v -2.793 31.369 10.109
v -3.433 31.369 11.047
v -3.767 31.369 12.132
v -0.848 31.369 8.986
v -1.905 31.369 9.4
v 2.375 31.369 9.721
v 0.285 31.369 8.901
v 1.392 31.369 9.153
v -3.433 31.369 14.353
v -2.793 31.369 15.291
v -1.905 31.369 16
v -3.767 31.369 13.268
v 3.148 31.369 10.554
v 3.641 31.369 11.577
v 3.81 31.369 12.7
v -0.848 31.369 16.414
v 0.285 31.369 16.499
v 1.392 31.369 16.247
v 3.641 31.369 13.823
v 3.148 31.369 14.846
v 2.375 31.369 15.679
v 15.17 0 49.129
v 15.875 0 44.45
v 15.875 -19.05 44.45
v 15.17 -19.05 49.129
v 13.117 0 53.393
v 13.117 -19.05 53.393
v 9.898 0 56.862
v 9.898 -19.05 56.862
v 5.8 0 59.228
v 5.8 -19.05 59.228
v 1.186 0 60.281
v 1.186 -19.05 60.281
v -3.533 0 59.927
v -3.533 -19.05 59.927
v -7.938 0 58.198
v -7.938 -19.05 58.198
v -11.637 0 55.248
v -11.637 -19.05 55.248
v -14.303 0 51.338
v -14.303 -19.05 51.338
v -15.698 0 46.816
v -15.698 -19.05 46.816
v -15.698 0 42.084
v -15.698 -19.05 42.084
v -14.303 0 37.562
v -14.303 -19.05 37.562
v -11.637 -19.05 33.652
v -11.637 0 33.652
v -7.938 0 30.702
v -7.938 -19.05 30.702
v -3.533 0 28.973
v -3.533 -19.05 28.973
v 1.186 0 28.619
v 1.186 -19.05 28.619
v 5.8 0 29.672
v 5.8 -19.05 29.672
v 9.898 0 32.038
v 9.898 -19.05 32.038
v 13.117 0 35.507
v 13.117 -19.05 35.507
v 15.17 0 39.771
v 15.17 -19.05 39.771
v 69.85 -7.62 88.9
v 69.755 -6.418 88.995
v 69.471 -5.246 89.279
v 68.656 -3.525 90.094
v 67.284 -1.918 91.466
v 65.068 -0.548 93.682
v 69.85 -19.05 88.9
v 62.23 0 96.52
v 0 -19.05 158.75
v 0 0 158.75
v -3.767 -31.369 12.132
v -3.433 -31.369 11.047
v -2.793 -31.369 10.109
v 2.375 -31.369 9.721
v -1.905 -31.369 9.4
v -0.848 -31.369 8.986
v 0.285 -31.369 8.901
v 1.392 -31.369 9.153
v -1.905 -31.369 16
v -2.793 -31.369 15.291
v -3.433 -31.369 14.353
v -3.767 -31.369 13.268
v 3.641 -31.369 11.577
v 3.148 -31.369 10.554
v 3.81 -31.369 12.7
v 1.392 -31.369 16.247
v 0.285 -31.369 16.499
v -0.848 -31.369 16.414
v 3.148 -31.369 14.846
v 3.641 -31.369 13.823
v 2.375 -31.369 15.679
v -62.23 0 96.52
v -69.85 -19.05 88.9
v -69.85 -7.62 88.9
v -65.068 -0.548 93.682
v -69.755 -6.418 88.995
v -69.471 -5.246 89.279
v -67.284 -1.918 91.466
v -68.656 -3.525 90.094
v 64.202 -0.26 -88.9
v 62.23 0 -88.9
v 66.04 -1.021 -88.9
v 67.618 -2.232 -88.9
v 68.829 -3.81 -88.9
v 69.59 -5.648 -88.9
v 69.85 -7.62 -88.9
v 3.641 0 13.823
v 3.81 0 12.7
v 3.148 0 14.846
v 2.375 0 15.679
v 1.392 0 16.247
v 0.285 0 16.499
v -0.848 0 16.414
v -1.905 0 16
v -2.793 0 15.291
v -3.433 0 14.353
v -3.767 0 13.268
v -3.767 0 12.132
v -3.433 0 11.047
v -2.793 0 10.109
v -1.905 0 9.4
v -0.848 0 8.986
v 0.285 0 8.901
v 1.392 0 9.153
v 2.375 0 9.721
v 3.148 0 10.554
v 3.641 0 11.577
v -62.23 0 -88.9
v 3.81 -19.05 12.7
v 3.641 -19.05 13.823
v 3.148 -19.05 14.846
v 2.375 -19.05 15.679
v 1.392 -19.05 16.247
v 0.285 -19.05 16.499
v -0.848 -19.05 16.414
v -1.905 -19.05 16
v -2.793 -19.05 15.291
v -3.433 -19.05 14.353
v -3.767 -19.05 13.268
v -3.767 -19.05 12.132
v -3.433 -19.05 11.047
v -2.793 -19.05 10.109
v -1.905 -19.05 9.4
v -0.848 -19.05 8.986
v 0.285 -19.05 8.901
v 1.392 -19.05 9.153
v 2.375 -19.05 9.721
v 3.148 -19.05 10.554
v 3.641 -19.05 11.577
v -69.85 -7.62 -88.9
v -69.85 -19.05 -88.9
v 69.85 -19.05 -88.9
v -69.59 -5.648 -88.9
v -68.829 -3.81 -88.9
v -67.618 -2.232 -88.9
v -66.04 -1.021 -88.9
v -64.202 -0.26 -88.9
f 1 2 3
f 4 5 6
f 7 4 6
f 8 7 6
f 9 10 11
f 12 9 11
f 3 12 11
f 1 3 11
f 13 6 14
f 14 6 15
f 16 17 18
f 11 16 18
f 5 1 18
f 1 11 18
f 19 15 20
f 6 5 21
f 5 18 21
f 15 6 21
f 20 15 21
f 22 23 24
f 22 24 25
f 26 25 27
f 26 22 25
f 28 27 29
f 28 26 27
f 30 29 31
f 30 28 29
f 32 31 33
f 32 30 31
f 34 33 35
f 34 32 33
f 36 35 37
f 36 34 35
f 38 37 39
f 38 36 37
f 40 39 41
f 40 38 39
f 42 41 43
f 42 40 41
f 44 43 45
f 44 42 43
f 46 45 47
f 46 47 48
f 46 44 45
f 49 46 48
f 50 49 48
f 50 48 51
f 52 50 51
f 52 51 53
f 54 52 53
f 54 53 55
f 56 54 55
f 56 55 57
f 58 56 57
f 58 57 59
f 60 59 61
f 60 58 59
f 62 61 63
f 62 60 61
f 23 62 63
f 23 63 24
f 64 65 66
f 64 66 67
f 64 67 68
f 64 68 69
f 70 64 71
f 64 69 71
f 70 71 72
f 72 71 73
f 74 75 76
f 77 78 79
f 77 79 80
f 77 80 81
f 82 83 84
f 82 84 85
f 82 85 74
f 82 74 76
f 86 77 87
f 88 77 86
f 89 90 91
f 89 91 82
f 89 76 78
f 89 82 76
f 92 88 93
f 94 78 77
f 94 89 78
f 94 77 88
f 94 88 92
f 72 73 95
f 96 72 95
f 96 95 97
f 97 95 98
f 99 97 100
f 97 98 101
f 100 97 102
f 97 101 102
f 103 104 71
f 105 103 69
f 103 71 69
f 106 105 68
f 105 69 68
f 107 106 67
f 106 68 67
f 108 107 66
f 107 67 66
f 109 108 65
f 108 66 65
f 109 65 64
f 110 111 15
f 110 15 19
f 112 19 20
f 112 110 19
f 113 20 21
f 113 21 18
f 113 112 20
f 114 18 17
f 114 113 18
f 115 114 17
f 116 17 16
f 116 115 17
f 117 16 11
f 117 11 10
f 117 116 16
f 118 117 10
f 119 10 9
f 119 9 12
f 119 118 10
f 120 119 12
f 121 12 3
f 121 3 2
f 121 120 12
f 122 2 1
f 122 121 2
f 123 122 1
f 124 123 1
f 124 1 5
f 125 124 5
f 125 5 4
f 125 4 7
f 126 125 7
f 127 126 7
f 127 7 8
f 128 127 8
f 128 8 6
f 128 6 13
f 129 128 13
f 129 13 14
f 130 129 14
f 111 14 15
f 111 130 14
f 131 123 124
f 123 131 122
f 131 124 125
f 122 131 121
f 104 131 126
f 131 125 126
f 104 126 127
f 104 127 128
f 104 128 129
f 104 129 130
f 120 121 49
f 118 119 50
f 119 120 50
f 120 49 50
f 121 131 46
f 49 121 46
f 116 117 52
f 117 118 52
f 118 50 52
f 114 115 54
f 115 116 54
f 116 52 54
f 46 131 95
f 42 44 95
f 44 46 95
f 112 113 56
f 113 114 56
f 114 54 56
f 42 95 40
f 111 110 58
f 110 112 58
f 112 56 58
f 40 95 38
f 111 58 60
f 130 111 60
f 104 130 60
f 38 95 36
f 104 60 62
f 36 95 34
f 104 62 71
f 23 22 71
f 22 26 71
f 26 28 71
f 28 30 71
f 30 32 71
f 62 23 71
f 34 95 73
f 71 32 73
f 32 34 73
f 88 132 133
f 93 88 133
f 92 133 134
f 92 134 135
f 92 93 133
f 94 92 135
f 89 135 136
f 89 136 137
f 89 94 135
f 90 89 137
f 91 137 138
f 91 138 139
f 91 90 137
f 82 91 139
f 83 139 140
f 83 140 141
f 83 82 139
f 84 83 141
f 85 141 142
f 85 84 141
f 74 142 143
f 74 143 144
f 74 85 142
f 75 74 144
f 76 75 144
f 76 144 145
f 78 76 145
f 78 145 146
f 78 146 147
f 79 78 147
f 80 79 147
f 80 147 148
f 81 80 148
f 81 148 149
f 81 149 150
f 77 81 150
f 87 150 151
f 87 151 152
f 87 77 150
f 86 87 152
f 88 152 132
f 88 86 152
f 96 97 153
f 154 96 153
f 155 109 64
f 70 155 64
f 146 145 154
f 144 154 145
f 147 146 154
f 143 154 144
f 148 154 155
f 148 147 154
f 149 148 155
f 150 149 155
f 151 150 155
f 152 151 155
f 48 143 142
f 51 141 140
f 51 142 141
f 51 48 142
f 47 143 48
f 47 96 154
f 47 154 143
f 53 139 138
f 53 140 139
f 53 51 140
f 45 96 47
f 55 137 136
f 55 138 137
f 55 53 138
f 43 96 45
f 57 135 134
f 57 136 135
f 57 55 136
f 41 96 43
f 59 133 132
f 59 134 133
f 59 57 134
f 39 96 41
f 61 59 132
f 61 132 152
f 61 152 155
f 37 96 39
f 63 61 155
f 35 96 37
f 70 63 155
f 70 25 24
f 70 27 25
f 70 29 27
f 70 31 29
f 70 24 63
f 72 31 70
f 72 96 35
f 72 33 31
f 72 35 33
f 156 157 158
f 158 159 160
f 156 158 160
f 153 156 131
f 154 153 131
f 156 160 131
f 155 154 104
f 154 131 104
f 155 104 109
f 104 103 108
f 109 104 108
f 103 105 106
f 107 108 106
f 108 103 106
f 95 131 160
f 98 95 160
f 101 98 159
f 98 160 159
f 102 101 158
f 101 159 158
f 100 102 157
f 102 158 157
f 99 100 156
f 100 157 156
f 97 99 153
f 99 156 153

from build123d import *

# Parameters (mm, degrees)
F0_R     = 3.81
F0_R_2   = 15.875
F1_DEPTH = 19.05
F2_DEPTH = 31.369
F3_R     = 7.62
F4_R     = 7.62


with BuildPart() as f1:
    # F0 (on Front) → F1 (new body)
    with BuildSketch(Plane.XZ):
        Polygon((-69.850003, -88.899992), (69.849997, -88.900008), (69.850003, 88.899992), (0, 158.75), (-69.849997, 88.900008), align=None)
        with Locations((0, 12.7)):
            Circle(F0_R, mode=Mode.SUBTRACT)
        with Locations((0, 44.45)):
            Circle(F0_R_2, mode=Mode.SUBTRACT)
    extrude(amount=F1_DEPTH)

    # F0 (on Front) → F2 (join, symmetric)
    with BuildSketch(Plane.XZ):
        with Locations((0, 12.7)):
            Circle(F0_R)
    extrude(amount=F2_DEPTH, both=True)

    # F3
    f3_edges = [f1.edges().sort_by_distance(p)[0] for p in [
        (69.85, 0, -8e-06),
    ]]
    fillet(f3_edges, radius=F3_R)

    # F4
    f4_edges = [f1.edges().sort_by_distance(p)[0] for p in [
        (-69.85, 0, 8e-06),
    ]]
    fillet(f4_edges, radius=F4_R)


solid = f1.part
